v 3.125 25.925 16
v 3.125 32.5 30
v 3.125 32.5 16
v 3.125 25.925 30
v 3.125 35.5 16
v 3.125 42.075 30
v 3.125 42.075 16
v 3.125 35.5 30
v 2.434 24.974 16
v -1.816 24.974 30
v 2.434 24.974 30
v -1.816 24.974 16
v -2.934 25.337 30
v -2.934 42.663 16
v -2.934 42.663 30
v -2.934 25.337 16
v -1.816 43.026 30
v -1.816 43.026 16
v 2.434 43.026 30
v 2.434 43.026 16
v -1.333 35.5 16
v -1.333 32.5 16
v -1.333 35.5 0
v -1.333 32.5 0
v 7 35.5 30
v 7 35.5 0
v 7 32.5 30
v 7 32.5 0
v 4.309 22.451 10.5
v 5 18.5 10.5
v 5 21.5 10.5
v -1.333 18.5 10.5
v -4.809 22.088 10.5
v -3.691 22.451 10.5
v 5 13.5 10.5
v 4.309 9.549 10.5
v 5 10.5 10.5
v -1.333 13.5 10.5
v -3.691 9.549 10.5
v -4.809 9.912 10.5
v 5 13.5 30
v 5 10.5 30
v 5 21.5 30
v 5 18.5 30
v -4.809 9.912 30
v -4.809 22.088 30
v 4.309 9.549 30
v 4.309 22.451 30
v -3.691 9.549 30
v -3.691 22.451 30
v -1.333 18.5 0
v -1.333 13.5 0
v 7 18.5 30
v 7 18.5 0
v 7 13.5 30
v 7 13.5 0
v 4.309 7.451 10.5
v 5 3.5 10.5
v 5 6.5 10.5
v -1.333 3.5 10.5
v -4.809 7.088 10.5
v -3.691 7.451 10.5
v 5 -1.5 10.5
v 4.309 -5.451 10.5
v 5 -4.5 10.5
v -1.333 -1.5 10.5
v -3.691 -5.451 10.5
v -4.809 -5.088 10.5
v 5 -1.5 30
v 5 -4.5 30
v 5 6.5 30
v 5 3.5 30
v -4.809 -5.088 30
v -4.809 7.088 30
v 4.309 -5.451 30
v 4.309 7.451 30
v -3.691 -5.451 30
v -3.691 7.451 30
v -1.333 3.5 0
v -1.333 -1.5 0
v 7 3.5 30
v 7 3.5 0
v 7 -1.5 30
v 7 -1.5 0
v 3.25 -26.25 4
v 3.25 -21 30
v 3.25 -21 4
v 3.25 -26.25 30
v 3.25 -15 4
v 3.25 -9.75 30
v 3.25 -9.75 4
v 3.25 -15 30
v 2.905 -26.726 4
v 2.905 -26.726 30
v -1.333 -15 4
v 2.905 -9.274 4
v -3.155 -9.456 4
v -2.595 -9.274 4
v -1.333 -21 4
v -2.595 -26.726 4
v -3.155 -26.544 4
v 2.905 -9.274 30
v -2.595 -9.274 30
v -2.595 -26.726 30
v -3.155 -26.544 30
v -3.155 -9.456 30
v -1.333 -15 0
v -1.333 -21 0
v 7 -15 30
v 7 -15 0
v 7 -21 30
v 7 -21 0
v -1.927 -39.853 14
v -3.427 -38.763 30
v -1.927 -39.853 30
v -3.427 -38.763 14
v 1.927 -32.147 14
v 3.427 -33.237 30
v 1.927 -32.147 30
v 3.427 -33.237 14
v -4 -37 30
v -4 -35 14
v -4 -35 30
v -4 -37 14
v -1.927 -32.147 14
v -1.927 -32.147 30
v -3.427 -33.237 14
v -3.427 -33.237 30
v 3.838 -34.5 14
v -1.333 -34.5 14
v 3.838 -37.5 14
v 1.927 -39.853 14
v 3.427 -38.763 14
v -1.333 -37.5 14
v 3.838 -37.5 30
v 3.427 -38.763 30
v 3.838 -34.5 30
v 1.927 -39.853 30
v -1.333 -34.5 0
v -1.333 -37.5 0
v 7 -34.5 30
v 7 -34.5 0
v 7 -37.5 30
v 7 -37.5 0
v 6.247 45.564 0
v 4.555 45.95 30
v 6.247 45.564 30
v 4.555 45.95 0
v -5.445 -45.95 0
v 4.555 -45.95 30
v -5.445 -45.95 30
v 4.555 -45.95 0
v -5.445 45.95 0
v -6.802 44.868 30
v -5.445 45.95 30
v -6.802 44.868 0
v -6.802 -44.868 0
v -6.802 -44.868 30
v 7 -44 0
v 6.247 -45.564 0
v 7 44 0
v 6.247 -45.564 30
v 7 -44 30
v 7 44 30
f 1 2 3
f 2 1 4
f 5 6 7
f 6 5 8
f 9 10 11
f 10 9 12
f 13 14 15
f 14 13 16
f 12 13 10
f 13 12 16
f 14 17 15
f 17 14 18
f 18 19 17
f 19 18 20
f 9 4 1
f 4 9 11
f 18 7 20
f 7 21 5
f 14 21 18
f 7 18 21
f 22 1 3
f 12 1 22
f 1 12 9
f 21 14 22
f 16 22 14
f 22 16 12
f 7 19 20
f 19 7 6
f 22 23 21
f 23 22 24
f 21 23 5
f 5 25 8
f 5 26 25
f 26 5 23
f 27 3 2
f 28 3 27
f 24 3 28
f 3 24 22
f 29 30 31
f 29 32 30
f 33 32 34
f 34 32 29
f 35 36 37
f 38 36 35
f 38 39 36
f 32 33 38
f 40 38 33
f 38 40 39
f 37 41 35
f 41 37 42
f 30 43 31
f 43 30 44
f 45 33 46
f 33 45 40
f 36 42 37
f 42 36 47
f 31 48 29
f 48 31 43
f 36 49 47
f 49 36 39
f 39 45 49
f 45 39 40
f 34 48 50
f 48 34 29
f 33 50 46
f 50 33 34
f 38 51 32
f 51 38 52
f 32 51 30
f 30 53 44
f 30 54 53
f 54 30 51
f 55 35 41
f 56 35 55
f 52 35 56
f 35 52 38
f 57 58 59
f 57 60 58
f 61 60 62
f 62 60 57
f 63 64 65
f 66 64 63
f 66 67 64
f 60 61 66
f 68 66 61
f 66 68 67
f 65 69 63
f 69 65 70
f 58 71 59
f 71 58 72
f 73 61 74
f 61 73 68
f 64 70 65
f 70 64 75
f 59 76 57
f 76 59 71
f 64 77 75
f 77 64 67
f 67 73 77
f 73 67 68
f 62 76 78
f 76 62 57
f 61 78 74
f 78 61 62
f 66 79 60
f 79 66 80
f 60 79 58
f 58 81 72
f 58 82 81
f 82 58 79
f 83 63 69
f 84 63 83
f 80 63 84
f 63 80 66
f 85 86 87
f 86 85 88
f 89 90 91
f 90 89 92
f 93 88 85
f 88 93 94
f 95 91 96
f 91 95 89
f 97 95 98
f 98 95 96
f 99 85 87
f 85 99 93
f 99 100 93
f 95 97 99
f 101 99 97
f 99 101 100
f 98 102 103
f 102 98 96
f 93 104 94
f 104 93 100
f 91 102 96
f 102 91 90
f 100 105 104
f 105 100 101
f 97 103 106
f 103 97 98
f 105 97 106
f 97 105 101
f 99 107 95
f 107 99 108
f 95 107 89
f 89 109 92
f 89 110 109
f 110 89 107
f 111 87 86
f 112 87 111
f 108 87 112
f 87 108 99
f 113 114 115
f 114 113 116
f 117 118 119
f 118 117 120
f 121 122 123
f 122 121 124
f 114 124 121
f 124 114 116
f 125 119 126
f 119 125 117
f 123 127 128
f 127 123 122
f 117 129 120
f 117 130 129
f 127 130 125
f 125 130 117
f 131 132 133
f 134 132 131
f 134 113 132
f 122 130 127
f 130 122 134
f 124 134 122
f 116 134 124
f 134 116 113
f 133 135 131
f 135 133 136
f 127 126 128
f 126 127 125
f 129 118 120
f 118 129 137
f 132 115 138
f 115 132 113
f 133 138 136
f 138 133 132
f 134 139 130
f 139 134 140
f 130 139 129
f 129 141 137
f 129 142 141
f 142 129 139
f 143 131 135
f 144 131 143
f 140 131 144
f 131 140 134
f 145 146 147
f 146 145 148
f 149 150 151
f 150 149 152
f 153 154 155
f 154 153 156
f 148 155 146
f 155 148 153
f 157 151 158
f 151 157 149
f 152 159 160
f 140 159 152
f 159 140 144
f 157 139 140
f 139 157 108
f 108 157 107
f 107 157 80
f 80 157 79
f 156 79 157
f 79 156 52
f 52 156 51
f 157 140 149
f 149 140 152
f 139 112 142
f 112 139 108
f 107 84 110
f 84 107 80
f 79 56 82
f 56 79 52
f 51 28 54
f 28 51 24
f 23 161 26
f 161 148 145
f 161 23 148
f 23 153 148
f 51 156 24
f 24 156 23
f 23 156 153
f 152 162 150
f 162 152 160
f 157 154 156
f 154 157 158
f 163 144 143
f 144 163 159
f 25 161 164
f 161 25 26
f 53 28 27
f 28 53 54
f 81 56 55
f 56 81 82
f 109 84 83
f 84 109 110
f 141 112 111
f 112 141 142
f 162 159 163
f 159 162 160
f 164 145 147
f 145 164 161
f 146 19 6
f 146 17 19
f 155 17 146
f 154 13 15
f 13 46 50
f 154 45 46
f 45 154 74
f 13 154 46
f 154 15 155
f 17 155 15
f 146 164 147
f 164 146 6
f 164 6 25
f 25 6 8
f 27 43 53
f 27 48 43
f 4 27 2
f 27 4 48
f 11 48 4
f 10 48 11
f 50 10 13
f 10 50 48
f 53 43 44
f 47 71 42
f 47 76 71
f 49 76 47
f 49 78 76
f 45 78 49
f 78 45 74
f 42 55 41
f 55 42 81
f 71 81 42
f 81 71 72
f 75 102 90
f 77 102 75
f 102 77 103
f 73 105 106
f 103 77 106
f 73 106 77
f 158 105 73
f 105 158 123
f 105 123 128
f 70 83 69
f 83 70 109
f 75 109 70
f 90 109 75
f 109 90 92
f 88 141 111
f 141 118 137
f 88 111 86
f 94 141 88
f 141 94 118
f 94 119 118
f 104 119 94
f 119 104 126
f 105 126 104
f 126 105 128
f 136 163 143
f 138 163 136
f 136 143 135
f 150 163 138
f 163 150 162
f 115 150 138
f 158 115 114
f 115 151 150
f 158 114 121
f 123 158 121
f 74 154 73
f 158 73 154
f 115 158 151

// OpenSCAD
// Macbook Pro Customizable Cable Dock
// by knarfishness, 01/30/16

//CUSTOMIZER VARIABLES

/* [Outer Wall Values] */

// The width (long side) of the dock module
outer_width = 90; // [80:120]
// The depth (short side) of the dock module
outer_depth = 12; // [10:20]
// The height (distance from laptop) of the dock module
outer_height = 30; // [20:50]
// How much to smooth the outer corners
outer_radius = 2; // [0.01:6]


/* [Power Adapter Settings] */

// Slot width
power_width = 17.15; // [17:18]
// Slot depth
power_depth = 5.25; // [5:7]
// Slot height
power_height = 13; // [10:15]
// Corner Smoothing
power_radius = 1; // [0.01:2]
// Cable width
power_cablewidth = 1.5; // [1.0:3.0]
// X-Offset (this should not need to change)
power_xoffset = 34;


/* [Video Port #1 Settings] */

// Slot width
videoA_width = 12; // [10:15]
// Slot depth
videoA_depth = 9; // [8:12]
// Slot height
videoA_height = 18.5; // [17:20]
// Corner smoothing
videoA_radius = 1; // [0.01:2]
// Cable width
videoA_cablewidth = 2.5; // [1.0:3.0]
// X-Offset (this should not need to change)
videoA_xoffset = 16;


/* [Video Port #2 Settings] */

// Slot width
videoB_width = 12; // [10:15]
// Slot depth
videoB_depth = 9; // [8:12]
// Slot height
videoB_height = 18.5; // [17:20]
// Corner smoothing
videoB_radius = 1; // [0.01:2]
// Cable width
videoB_cablewidth = 2.5; // [1.0:3.0]
// X-Offset (this should not need to change)
videoB_xoffset = 1;


/* [USB Port Settings] */

// Slot width
usb_width = 17; // [15:20]
// Slot depth
usb_depth = 6; // [4:8]
// Slot height
usb_height = 25; // [23:27]
// Corner smoothing
usb_radius = 0.5; // [0.01:2]
// Cable width
usb_cablewidth = 3; // [1.0:3.0]
// X-Offset (this should not need to change)
usb_xoffset = -18;


/* [(Optional) Audio Port Settings] */

// Generate a space for the audio port?
generate_audio = "Yes"; // [Yes,No]
// Slot width
audio_width = 5; // [3:7]
// Slot depth
audio_depth = 5; // [3:7]
// Slot height
audio_height = 15; // [10:20]
// Corner smoothing
audio_radius = 3; // [0.01:4]
// Cable width
audio_cablewidth = 1.5; // [1.0:3.0]
// X-Offset (this should not need to change)
audio_xoffset = -36;

//CUSTOMIZER VARIABLES END


// untweakable variables
power_zoffset = outer_height - power_height;
power = [power_width,power_depth,power_height,power_radius,power_cablewidth,power_xoffset,power_zoffset];

videoA_zoffset = outer_height - videoA_height;
videoA = [videoA_width,videoA_depth,videoA_height,videoA_radius,videoA_cablewidth,videoA_xoffset,videoA_zoffset];

videoB_zoffset = outer_height - videoB_height;
videoB = [videoB_width,videoB_depth,videoB_height,videoB_radius,videoB_cablewidth,videoB_xoffset,videoB_zoffset];

usb_zoffset = outer_height - usb_height;
usb = [usb_width,usb_depth,usb_height,usb_radius,usb_cablewidth,usb_xoffset,usb_zoffset];

audio_zoffset = outer_height - audio_height;
audio = [audio_width,audio_depth,audio_height,audio_radius,audio_cablewidth,audio_xoffset,audio_zoffset];


module outerShell() {
	roundedRect([ outer_depth, outer_width, outer_height ], outer_radius);
}

module smallerOuterShell() {
	translate([0,8,0])
	roundedRect([ outer_depth, outer_width-10, outer_height ], outer_radius);
}


// width, depth, height, radius, cablewidth, xoffset, zoffset
module port(name) {
	translate([0, name[5], name[6]-1]) 
		roundedRect([name[1], name[0], name[2]+2], name[3]);

	translate([-outer_depth/9, name[5]-(name[4]*2/2), -1])
		cube([outer_depth, name[4]*2, outer_height+2], center=false);

}


// module videoA
// module videoB
// module usb
// module audio

module ports5() {
	port(power);
	port(videoA);
	port(videoB);
	port(usb);
	port(audio);
}

module ports4() {
	port(power);
	port(videoA);
	port(videoB);
	port(usb);
}

module roundedRect(size, radius)
{
    x = size[0];
    y = size[1];
    z = size[2];

    linear_extrude(height=z)
    hull()
    {
        // place 4 circles in the corners, with the given radius
        translate([(-x/2)+(radius/2), (-y/2)+(radius/2), 0])
        circle(r=radius);

        translate([(x/2)-(radius/2), (-y/2)+(radius/2), 0])
        circle(r=radius);

        translate([(-x/2)+(radius/2), (y/2)-(radius/2), 0])
        circle(r=radius);

        translate([(x/2)-(radius/2), (y/2)-(radius/2), 0])
        circle(r=radius);
    }
}

module build()
{
	if(generate_audio == "Yes")
	{
		difference() {
			outerShell();
			ports5();
		}
	}
	else 
	{
		difference() {
			smallerOuterShell();
			ports4();
		}
	}
}

build();
